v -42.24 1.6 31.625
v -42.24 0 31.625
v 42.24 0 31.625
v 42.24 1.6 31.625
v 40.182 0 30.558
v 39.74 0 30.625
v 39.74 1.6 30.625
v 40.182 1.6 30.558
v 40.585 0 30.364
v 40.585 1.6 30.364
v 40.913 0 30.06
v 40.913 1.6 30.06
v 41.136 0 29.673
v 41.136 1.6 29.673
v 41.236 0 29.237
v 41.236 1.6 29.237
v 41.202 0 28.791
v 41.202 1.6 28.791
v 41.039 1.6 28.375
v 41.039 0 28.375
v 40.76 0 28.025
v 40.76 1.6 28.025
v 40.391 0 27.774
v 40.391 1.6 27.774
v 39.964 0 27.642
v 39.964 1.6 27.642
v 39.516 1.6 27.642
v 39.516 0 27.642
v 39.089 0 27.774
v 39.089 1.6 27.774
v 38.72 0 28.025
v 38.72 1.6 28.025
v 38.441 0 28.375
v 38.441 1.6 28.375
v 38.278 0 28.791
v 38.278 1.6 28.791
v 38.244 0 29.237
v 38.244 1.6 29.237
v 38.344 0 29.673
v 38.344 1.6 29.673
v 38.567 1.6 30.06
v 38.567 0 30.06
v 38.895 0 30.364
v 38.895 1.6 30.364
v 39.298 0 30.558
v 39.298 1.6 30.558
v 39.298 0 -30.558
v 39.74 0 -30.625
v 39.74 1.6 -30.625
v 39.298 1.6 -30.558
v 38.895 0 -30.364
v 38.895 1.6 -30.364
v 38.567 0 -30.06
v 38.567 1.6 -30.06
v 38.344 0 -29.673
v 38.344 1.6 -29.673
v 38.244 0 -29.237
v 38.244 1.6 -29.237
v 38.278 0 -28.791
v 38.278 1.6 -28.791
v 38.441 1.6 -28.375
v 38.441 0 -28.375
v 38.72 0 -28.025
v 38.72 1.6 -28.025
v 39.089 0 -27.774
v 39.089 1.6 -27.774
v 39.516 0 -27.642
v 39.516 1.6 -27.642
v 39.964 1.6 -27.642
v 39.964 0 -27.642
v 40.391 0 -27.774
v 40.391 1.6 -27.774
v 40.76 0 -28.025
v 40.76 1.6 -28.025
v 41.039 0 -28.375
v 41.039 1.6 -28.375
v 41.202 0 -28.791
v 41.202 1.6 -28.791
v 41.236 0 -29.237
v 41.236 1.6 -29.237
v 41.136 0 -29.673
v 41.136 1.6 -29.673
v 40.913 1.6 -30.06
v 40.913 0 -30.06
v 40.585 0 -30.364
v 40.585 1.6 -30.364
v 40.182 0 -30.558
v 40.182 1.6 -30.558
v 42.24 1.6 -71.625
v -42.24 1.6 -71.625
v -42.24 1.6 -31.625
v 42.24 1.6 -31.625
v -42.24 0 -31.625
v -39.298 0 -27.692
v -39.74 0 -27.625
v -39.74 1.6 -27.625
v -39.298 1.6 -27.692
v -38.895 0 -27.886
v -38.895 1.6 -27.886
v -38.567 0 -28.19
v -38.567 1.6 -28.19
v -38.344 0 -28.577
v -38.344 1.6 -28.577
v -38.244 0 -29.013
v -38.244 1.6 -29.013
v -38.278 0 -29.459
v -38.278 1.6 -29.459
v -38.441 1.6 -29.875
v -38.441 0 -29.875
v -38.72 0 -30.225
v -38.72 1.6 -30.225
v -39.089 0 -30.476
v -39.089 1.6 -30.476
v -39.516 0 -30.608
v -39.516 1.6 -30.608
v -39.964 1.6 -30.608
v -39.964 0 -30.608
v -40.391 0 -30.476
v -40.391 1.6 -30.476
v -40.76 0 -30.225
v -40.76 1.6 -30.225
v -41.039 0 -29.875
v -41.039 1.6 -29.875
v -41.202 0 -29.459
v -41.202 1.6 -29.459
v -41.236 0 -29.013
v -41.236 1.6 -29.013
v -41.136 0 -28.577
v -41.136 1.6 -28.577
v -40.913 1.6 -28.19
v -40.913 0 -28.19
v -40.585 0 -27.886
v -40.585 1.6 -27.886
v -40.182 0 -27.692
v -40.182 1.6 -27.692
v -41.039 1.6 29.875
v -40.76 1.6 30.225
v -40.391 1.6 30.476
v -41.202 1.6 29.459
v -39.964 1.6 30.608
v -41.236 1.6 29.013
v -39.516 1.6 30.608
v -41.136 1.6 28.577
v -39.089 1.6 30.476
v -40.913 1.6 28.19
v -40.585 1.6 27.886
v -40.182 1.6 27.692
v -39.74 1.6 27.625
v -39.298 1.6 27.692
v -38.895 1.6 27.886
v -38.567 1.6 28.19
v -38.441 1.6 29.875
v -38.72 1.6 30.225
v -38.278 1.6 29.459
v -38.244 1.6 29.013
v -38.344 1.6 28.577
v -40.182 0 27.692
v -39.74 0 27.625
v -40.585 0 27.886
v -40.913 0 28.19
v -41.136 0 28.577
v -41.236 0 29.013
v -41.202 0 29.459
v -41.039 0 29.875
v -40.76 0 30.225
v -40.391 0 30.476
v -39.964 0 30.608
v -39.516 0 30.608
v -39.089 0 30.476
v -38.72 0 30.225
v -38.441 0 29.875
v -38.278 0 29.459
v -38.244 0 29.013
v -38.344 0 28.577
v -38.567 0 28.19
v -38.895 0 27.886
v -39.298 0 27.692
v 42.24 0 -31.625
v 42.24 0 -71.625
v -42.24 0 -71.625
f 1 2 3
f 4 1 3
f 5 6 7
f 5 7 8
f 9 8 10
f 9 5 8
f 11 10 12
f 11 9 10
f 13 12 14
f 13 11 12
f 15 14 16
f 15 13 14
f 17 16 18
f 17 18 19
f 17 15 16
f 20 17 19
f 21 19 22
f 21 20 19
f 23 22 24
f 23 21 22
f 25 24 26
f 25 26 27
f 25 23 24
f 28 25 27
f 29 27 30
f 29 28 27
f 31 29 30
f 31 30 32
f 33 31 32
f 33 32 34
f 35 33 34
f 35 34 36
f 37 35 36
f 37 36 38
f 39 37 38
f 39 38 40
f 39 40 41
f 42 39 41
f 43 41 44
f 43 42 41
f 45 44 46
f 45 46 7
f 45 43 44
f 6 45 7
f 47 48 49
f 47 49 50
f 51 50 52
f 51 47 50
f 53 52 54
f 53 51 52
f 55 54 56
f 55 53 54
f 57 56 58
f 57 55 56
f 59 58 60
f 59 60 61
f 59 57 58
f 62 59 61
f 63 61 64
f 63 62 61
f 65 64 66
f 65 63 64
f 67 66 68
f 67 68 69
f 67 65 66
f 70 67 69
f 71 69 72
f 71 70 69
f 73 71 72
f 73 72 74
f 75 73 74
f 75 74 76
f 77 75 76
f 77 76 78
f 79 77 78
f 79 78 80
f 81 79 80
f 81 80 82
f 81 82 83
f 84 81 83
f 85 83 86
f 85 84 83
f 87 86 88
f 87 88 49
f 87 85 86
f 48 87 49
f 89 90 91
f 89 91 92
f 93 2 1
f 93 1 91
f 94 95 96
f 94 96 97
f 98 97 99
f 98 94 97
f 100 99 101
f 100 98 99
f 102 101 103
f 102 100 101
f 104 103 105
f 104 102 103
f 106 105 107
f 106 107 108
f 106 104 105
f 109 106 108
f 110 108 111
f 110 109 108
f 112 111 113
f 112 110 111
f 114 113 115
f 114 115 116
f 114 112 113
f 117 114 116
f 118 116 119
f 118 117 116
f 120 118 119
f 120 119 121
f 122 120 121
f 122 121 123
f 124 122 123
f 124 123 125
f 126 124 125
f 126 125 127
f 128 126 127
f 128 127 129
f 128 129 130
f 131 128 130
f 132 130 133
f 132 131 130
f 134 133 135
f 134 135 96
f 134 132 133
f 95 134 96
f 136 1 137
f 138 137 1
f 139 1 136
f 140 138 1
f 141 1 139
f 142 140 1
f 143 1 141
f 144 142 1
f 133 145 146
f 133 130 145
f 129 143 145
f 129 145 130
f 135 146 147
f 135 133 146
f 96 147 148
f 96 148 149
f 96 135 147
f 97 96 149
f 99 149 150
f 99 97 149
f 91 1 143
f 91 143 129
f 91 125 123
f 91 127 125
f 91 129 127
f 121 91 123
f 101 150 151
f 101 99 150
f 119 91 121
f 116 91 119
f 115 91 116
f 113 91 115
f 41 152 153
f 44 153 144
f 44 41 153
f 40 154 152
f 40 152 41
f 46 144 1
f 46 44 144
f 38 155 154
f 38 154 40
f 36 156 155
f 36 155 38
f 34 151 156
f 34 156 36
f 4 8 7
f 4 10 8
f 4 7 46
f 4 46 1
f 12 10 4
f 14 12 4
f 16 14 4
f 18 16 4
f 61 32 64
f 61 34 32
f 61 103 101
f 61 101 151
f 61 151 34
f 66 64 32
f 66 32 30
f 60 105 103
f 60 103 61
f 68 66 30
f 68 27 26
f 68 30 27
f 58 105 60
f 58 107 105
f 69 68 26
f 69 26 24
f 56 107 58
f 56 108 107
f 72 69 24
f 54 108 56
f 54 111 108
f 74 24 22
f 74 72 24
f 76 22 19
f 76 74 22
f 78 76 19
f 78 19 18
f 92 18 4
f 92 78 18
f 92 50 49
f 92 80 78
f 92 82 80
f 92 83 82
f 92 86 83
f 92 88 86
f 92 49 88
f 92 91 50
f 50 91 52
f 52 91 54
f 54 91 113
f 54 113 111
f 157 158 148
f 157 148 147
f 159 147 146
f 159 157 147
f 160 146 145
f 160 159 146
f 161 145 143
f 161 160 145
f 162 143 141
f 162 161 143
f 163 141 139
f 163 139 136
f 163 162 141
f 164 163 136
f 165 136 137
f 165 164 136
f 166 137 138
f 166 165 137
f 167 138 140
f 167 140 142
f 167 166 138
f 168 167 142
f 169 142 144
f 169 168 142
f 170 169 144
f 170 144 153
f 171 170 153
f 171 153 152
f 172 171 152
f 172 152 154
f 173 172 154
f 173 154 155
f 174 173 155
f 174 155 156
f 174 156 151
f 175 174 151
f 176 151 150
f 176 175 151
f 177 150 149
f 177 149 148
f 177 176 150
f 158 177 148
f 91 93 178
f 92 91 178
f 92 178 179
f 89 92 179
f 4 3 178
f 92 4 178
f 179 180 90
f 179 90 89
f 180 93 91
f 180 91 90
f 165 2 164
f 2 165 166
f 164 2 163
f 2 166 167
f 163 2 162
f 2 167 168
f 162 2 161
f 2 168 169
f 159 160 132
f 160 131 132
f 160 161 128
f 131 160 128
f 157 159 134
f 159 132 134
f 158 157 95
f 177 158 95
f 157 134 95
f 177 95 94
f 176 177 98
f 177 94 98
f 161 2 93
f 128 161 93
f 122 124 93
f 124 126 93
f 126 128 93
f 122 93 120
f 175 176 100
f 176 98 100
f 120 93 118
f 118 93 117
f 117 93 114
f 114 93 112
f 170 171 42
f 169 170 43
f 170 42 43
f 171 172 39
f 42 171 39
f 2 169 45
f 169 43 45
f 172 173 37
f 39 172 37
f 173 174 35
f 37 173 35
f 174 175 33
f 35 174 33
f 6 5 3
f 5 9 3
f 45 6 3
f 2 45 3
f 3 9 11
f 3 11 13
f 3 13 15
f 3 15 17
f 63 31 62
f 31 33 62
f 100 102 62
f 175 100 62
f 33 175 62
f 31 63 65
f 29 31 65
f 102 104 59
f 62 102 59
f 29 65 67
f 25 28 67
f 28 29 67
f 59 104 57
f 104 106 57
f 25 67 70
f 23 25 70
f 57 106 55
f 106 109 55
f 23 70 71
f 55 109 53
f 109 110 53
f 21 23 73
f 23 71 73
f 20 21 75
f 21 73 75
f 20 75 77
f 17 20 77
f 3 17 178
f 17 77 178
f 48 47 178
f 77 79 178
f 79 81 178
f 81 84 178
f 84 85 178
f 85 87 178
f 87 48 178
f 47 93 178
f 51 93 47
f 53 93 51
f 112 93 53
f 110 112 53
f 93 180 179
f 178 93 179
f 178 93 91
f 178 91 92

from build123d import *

# Parameters (mm, degrees)
SKETCH1_W           = 84.48
SKETCH1_H           = 63.25
SKETCH1_R           = 1.5
BOSS_EXTRUDE1_DEPTH = 1.6
SKETCH2_W           = 84.48
SKETCH2_H           = 40
BOSS_EXTRUDE2_DEPTH = 1.6


with BuildPart() as part:
    # Sketch1 → Boss-Extrude1 (new body)
    with BuildSketch(Plane(origin=(0, 0, 0), x_dir=(1, 0, 0), z_dir=(0, 1, 0))):
        Rectangle(SKETCH1_W, SKETCH1_H)
        with Locations(Location((-39.74, 29.125, 0), (0, 0, 270))):
            Circle(SKETCH1_R, mode=Mode.SUBTRACT)
        with Locations(Location((-39.74, -29.125, 0), (0, 0, 90))):
            Circle(SKETCH1_R, mode=Mode.SUBTRACT)
        with Locations(Location((39.74, -29.125, 0), (0, 0, 270))):
            Circle(SKETCH1_R, mode=Mode.SUBTRACT)
        with Locations(Location((39.74, 29.125, 0), (0, 0, 90))):
            Circle(SKETCH1_R, mode=Mode.SUBTRACT)
    extrude(amount=BOSS_EXTRUDE1_DEPTH)


with BuildPart() as body_2:
    # Sketch2 → Boss-Extrude2 (new body)
    with BuildSketch(Plane(origin=(0, 0, 0), x_dir=(1, 0, 0), z_dir=(0, 1, 0))):
        with Locations((0, 51.625)):
            Rectangle(SKETCH2_W, SKETCH2_H)
    extrude(amount=BOSS_EXTRUDE2_DEPTH)


solid = Compound([part.part, body_2.part])
